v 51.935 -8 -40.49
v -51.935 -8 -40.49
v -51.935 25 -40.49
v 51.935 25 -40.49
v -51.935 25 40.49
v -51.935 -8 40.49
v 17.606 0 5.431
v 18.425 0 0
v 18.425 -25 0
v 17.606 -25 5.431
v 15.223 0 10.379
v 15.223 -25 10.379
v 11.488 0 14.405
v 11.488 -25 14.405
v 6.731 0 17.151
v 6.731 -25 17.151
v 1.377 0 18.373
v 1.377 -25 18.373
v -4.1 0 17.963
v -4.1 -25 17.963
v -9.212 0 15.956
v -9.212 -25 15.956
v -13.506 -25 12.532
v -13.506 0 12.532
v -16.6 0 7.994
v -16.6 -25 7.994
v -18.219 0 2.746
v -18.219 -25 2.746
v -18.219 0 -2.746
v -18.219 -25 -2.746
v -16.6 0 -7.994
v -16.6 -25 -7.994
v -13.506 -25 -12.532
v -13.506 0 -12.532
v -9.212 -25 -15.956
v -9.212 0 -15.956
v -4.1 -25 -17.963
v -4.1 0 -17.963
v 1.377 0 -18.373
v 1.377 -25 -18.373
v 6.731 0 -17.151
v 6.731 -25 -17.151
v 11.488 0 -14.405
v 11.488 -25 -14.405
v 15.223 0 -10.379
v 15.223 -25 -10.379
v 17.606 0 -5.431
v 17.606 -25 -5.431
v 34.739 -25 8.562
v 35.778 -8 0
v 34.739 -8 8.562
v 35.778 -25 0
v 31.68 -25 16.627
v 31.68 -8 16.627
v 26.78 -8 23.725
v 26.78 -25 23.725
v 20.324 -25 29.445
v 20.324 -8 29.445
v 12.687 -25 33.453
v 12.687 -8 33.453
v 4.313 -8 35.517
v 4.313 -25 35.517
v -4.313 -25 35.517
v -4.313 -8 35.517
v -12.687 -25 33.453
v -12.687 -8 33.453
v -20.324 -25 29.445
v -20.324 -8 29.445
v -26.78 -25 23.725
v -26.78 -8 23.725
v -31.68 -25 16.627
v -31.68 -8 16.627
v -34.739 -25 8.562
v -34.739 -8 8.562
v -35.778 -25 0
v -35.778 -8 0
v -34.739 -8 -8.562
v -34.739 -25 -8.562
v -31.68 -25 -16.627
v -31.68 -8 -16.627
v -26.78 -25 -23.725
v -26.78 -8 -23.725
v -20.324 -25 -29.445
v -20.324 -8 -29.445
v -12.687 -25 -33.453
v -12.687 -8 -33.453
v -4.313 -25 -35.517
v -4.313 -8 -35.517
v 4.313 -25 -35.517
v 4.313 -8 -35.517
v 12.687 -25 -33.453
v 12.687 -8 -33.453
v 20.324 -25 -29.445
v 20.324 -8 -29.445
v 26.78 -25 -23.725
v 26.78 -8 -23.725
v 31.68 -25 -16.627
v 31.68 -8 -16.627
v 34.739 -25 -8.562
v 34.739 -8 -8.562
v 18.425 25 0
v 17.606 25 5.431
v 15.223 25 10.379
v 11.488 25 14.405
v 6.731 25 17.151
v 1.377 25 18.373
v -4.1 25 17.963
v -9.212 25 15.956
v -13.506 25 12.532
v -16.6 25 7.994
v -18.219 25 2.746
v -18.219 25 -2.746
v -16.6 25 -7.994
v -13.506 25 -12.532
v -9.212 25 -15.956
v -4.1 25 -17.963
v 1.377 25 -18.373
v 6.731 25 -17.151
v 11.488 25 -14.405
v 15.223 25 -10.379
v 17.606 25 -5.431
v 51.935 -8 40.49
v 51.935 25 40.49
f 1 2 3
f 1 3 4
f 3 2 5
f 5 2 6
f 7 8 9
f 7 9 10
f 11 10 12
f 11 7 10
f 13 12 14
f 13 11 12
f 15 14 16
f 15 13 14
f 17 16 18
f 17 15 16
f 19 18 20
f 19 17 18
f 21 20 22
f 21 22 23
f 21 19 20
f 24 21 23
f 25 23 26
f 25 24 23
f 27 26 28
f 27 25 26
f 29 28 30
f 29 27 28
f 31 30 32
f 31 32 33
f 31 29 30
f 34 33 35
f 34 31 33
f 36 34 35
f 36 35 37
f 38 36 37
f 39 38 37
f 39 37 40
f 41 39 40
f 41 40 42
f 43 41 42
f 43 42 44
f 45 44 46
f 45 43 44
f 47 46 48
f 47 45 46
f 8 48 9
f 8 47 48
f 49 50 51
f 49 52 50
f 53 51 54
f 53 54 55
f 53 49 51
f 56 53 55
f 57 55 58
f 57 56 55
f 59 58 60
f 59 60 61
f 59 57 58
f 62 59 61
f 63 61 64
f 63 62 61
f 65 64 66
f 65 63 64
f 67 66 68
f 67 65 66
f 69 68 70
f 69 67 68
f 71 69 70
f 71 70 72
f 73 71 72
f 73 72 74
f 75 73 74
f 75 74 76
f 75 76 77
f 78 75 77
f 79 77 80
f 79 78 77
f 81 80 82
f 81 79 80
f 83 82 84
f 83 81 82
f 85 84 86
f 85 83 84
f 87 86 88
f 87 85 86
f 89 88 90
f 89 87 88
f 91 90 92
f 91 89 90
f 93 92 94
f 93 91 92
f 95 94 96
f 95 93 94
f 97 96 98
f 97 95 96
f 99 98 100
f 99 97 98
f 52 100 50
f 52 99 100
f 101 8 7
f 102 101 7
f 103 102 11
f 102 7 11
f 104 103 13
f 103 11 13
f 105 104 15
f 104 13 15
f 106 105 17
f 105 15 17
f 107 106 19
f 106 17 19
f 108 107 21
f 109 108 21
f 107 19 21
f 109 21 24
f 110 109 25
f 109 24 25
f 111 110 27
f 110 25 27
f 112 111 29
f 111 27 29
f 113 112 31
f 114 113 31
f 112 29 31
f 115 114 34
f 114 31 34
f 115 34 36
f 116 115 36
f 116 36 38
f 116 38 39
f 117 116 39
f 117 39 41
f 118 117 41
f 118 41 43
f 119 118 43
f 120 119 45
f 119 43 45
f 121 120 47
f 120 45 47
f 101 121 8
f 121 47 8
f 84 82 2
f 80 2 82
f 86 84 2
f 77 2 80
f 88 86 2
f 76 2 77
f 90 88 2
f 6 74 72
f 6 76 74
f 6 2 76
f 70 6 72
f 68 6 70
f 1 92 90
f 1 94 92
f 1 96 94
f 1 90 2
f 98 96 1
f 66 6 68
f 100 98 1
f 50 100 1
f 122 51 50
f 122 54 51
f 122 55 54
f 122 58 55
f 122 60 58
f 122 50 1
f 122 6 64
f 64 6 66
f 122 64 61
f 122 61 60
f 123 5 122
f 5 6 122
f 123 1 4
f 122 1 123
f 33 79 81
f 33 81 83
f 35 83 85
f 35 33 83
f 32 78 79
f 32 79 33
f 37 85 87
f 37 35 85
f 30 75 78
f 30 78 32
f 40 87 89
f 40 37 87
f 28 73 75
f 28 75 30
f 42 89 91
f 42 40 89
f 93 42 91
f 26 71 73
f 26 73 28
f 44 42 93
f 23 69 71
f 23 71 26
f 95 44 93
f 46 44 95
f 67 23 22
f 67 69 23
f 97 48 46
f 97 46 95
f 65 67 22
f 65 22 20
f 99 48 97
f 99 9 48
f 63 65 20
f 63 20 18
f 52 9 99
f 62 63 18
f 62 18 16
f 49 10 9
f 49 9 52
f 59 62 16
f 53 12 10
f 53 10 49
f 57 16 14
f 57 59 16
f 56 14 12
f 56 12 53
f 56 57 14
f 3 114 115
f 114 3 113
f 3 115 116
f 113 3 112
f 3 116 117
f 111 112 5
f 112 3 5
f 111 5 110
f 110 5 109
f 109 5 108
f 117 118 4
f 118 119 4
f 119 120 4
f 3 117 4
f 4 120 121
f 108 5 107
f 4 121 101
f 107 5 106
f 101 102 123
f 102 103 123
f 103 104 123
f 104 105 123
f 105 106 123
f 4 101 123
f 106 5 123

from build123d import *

# Parameters (mm, degrees)
F0_R          = 35.778337
F0_R_2        = 18.424751
F1_DEPTH      = 25
F1_DEPTH_BACK = 25
F0_W          = 103.87025
F0_H          = 80.97905
F2_DEPTH      = 8
F2_DEPTH_BACK = 25


with BuildPart() as f1:
    # F0 (on Front) → F1 (new body, two sides)
    with BuildSketch(Plane.XZ) as f1_sk:
        Circle(F0_R)
        Circle(F0_R_2, mode=Mode.SUBTRACT)
    extrude(amount=F1_DEPTH)
    extrude(f1_sk.sketch, amount=-F1_DEPTH_BACK)

    # F0 (on Front) → F2 (join, two sides)
    with BuildSketch(Plane.XZ) as f2_sk:
        Rectangle(F0_W, F0_H)
        Circle(F0_R, mode=Mode.SUBTRACT)
    extrude(amount=F2_DEPTH)
    extrude(f2_sk.sketch, amount=-F2_DEPTH_BACK)


solid = f1.part
